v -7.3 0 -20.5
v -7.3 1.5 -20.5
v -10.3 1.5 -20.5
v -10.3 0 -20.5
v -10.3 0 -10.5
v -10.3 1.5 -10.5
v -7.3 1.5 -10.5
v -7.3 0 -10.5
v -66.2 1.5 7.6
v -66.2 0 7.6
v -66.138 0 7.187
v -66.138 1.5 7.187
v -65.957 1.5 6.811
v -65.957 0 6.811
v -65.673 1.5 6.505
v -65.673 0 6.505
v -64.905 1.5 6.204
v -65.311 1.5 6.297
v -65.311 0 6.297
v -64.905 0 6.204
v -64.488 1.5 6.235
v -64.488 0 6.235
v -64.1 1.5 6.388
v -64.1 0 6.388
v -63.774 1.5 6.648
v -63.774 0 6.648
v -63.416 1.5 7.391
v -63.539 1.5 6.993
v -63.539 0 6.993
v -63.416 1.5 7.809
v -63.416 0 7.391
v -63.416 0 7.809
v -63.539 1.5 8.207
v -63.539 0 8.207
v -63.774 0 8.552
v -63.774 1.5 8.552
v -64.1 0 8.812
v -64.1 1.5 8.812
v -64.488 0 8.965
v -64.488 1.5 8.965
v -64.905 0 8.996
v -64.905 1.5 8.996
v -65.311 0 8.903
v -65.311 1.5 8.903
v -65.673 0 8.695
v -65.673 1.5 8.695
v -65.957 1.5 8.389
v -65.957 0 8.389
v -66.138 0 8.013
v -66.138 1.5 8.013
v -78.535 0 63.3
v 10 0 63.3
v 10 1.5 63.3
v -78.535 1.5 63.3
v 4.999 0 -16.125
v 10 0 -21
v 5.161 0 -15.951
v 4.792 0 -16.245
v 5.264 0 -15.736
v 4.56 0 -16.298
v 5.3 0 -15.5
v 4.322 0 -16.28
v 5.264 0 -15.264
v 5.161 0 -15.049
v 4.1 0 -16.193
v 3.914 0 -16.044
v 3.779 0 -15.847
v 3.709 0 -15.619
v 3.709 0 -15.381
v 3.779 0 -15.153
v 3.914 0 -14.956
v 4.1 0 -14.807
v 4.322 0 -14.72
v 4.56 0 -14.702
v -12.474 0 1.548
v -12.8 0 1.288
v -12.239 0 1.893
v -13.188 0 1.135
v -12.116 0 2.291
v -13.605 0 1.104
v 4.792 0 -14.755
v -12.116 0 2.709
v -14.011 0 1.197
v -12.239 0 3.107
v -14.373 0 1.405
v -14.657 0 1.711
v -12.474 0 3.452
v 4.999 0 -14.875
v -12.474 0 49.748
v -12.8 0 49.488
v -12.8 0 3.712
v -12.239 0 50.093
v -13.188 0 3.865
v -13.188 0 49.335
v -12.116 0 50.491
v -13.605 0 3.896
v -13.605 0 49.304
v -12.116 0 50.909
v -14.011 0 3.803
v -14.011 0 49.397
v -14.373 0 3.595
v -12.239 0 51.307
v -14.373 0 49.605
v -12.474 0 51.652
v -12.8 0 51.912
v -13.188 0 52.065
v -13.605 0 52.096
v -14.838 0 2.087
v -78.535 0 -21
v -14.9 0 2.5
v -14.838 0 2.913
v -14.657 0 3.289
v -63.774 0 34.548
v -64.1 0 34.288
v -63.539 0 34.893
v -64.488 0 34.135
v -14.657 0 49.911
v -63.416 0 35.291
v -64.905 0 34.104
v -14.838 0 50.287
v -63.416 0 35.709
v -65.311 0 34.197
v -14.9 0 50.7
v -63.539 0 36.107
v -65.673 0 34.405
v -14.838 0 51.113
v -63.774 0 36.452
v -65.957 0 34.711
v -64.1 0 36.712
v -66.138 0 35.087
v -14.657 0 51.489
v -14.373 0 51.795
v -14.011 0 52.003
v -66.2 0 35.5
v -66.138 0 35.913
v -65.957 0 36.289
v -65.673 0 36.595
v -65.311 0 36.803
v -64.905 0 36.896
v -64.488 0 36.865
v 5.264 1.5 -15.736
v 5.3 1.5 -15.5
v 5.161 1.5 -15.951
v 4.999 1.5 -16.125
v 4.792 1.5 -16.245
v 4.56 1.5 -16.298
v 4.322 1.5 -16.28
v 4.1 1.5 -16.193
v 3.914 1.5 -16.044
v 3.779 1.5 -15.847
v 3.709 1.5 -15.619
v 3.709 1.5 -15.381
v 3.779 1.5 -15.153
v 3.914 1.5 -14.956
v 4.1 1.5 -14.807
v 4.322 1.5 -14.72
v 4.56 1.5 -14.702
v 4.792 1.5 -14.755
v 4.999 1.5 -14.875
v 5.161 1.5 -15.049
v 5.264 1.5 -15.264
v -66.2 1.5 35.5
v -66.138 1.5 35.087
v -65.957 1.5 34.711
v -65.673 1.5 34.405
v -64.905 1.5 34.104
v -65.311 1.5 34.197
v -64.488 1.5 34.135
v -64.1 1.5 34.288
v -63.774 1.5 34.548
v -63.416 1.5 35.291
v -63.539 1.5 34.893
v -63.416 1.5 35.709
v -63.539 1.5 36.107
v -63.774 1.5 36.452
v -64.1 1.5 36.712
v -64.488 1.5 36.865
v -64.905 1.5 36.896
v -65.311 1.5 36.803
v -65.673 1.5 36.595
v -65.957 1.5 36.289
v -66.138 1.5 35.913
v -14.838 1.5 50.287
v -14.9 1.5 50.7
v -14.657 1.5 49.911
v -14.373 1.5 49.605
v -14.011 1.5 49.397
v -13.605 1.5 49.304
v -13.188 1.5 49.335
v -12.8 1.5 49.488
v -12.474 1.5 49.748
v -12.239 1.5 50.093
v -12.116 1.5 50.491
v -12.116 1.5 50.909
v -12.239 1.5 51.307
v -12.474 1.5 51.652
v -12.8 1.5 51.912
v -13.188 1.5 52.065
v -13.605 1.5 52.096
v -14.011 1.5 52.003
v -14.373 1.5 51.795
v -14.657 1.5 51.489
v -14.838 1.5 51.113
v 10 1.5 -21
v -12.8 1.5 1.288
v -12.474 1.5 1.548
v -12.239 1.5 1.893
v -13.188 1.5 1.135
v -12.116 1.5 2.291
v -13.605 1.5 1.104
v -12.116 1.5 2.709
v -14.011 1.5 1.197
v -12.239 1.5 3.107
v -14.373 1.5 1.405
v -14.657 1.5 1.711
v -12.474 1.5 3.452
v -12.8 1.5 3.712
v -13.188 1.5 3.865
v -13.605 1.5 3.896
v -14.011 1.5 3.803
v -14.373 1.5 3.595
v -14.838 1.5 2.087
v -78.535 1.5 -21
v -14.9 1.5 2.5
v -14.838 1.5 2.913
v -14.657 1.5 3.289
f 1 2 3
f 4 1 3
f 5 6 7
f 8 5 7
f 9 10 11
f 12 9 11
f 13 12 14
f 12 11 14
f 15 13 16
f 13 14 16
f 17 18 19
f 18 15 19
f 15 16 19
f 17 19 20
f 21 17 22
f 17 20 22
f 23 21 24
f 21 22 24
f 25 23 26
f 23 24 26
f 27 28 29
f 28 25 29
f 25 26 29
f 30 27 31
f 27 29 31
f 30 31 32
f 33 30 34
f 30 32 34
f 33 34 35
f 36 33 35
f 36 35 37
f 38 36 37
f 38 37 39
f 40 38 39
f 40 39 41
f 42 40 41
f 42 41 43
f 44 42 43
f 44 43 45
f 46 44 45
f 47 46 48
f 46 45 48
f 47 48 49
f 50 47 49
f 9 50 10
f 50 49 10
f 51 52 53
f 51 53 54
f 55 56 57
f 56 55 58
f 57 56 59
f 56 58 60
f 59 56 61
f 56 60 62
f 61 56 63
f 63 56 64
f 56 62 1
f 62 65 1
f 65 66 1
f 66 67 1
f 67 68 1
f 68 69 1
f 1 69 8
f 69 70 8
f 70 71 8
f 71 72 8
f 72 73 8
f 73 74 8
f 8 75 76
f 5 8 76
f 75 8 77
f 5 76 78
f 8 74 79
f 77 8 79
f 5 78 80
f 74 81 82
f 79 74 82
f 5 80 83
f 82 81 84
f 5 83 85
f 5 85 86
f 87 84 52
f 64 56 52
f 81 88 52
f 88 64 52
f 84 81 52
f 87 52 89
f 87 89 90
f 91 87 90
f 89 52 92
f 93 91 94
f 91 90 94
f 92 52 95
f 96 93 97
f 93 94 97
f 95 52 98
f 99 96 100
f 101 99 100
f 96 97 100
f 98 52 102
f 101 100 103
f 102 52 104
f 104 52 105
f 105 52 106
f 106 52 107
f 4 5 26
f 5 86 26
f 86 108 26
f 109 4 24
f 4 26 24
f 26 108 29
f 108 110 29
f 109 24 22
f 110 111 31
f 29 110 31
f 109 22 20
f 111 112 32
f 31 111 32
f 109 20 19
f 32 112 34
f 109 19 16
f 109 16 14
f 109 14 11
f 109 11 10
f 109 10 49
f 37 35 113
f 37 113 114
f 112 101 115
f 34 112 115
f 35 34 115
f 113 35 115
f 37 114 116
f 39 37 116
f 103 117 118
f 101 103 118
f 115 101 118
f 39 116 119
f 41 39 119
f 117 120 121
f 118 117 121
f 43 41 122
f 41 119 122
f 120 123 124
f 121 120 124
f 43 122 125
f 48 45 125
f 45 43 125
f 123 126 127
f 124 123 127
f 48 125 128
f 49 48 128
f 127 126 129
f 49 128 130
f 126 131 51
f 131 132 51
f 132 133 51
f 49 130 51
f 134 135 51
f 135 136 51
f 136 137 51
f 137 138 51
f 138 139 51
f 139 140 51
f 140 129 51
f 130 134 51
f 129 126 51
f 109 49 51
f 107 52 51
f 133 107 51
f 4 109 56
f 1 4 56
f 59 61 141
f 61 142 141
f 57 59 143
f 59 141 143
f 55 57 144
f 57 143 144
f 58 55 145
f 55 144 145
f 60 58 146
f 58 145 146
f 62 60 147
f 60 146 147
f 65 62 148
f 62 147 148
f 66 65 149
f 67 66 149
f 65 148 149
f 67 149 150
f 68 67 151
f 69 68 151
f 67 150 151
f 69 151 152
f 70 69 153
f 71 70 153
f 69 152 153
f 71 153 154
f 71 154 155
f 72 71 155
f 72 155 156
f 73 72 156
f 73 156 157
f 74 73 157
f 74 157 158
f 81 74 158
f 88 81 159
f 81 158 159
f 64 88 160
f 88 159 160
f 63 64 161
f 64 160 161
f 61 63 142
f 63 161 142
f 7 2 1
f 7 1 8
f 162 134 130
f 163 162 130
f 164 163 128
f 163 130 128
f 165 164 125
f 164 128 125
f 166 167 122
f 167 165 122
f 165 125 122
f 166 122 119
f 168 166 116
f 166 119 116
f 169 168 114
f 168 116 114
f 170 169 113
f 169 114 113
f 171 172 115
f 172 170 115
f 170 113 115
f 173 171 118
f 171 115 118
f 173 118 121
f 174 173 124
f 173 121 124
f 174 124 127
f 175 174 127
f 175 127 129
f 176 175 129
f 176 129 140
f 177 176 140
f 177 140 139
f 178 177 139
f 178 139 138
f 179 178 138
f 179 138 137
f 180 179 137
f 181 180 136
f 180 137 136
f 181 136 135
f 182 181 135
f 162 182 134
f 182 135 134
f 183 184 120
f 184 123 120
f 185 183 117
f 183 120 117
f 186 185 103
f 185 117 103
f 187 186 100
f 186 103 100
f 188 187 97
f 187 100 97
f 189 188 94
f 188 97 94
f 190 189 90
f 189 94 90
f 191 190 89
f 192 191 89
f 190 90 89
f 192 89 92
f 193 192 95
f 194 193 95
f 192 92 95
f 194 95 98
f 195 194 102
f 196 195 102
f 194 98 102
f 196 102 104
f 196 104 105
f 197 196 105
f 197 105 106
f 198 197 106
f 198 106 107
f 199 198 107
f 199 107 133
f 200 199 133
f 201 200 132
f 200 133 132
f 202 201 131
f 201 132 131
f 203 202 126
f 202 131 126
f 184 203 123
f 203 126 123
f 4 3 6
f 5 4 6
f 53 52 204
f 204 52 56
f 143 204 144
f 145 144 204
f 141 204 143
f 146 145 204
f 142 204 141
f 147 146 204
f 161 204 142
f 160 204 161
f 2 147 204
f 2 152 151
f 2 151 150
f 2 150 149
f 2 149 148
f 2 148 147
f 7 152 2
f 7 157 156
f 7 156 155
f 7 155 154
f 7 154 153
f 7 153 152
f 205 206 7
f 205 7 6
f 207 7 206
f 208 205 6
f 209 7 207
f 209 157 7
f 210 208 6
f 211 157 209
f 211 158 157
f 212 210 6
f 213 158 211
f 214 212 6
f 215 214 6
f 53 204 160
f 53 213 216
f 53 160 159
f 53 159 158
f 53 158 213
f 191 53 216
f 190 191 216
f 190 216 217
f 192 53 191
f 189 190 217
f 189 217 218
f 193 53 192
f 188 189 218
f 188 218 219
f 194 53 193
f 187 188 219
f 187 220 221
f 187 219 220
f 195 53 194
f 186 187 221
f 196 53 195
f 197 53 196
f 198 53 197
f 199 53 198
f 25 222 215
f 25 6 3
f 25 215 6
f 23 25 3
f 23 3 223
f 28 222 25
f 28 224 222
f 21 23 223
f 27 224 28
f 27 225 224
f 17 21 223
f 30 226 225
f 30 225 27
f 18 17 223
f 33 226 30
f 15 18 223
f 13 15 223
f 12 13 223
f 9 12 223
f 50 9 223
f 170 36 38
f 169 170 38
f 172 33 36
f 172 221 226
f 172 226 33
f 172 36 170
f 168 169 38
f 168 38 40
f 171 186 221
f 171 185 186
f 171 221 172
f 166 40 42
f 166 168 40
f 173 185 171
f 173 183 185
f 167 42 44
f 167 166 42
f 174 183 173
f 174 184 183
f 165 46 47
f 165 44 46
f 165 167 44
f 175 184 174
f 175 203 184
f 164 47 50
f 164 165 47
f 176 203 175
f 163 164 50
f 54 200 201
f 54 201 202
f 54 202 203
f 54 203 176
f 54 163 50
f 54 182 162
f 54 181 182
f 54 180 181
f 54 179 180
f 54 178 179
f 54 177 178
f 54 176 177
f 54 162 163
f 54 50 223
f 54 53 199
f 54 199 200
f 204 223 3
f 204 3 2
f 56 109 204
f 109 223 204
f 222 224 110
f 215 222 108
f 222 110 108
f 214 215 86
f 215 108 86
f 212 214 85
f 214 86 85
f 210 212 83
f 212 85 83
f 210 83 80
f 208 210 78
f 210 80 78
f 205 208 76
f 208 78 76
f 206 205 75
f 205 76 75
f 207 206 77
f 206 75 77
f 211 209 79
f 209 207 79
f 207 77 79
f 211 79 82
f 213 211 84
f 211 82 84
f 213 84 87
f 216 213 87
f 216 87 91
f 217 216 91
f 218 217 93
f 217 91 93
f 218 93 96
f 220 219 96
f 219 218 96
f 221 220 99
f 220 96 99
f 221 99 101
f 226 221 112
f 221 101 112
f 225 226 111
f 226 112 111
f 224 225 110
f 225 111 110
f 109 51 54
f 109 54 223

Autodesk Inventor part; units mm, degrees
ref_plane "YZ Plane" through (0, 0, 0) normal (1, 0, 0) x (0, 1, 0)
ref_plane "XZ Plane" through (0, 0, 0) normal (0, 1, 0) x (-1, 0, 0)
ref_plane "XY Plane" through (0, 0, 0) normal (0, 0, 1) x (1, 0, 0)
sketch "Sketch1" plane through (0, 0, 0) normal (0, 1, 0) x (-1, 0, 0)
  line L0 (0, 0) -> (0, 53.3)
  line L1 (0, 53.3) -> (68.5346, 53.3)
  line L2 (68.5346, 53.3) -> (68.5346, 0)
  line L3 (68.5346, 0) -> (0, 0)
  line L4 (68.5346, 0) -> (68.5346, 2.5)
  line L5 (68.5346, 2.5) -> (68.5346, 7.6)
  line L6 (68.5346, 7.6) -> (68.5346, 35.5)
  line L7 (0, 53.3) -> (14, 53.3)
  line L8 (68.5346, 35.5) -> (68.5346, 50.7)
  circle A0 centre (13.5, 50.7) radius 1.4
  circle A1 centre (13.5, 2.5) radius 1.4
  circle A2 centre (64.8, 35.5) radius 1.4
  circle A3 centre (64.8, 7.6) radius 1.4
  line L9 (0, 63.3) -> (78.5346, 63.3)
  line L10 (78.5346, 63.3) -> (78.5346, 0)
  line L11 (-10, 53.3) -> (-10, -10)
  line L12 (-10, -10) -> (68.5346, -10)
  line L13 (-10, -10) -> (78.5346, -10)
  line L14 (78.5346, -10) -> (78.5346, 63.3)
  line L15 (78.5346, 63.3) -> (-10, 63.3)
  line L16 (-10, 63.3) -> (-10, -10)
  line L17 (74.5346, 63.3) -> (74.5346, -6)
  line L18 (74.5346, -6) -> (-10, -6)
  line L19 (78.5346, 59.3) -> (-6, 59.3)
  line L20 (-6, 59.3) -> (-6, -10)
  line L21 (14.5, 50.7) -> (14.5, 2.5)
  dimension "d0" = 53.3
  dimension "d1" = 68.5346
  dimension "d2" = 2.8
  dimension "d3" = 2.8
  dimension "d4" = 2.8
  dimension "d5" = 2.8
  dimension "d6" = 10
  dimension "d7" = 10
  dimension "d8" = 4
  dimension "d9" = 4
  dimension "d10" = 1
  dimension "d11" = 1
extrude "Extrusion1" add sketch "Sketch1" along normal blind 1.5 contours L0 L1 L2 L3 | L9 L17 L19 L20 L18 L11 L16 L15 | L9 L10 L19 L17 | L19 L10 L14 L13 L12 L20 L18 L17 | L17 L18 L20 L19 | L18 L20 L12 L11
sketch "Sketch3" plane through (0, 1.5, 0) normal (0, 1, 0) x (1, 0, 0)
  line L0 (10, -63.3) -> (10, 10) projected
  line L1 (10, 10) -> (-78.5346, 10)
  line L2 (-78.5346, 10) -> (-78.5346, 21)
  line L3 (-78.5346, 21) -> (10, 21)
  line L4 (10, 21) -> (10, 10)
  line L5 (10, 21) -> (4.5, 21)
  line L6 (4.5, 21) -> (4.5, 15.5)
  line L7 (4.5, 15.5) -> (10, 15.5)
  line L8 (10, 15.5) -> (10, 21)
  circle A0 centre (4.5, 15.5) radius 0.8
  point P0 (0, 0)
  dimension "d14" = 11
  dimension "d15" = 5.5
  dimension "d16" = 5.5
  dimension "d17" = 1.6
extrude "Extrusion2" add sketch "Sketch3" against normal blind 1.5 contours L1 L2 L3 L6 A0 L7 L4 | L7 A0 L6 L3 L4
sketch "Sketch4" plane through (0, 1.5, 0) normal (0, 1, 0) x (1, 0, 0)
  circle A0 centre (4.5, 15.5) radius 0.8 projected
  line L0 (8.7, 15.5) -> (8.7, 20.5)
  line L1 (8.7, 20.5) -> (-11.3, 20.5)
  line L2 (-11.3, 20.5) -> (-11.3, 10.5)
  line L3 (-11.3, 10.5) -> (8.7, 10.5)
  line L4 (8.7, 10.5) -> (8.7, 15.5)
  line L5 (-11.3, 10.5) -> (-11.3, 20.5)
  line L6 (-10.3, 20.5) -> (-10.3, 10.5)
  line L7 (-6.3, 20.5) -> (-6.3, 10.5)
  line L8 (-7.3, 20.5) -> (-7.3, 10.5)
  point P0 (0, 0)
  dimension "d21" = 5
  dimension "d22" = 20
  dimension "d23" = 10
  dimension "d24" = 1
  dimension "d25" = 4
  dimension "d26" = 1
extrude "Extrusion3" cut sketch "Sketch4" against normal blind 15.4 contours L8 L3 L6 L1
properties part number "FitmentCard"
